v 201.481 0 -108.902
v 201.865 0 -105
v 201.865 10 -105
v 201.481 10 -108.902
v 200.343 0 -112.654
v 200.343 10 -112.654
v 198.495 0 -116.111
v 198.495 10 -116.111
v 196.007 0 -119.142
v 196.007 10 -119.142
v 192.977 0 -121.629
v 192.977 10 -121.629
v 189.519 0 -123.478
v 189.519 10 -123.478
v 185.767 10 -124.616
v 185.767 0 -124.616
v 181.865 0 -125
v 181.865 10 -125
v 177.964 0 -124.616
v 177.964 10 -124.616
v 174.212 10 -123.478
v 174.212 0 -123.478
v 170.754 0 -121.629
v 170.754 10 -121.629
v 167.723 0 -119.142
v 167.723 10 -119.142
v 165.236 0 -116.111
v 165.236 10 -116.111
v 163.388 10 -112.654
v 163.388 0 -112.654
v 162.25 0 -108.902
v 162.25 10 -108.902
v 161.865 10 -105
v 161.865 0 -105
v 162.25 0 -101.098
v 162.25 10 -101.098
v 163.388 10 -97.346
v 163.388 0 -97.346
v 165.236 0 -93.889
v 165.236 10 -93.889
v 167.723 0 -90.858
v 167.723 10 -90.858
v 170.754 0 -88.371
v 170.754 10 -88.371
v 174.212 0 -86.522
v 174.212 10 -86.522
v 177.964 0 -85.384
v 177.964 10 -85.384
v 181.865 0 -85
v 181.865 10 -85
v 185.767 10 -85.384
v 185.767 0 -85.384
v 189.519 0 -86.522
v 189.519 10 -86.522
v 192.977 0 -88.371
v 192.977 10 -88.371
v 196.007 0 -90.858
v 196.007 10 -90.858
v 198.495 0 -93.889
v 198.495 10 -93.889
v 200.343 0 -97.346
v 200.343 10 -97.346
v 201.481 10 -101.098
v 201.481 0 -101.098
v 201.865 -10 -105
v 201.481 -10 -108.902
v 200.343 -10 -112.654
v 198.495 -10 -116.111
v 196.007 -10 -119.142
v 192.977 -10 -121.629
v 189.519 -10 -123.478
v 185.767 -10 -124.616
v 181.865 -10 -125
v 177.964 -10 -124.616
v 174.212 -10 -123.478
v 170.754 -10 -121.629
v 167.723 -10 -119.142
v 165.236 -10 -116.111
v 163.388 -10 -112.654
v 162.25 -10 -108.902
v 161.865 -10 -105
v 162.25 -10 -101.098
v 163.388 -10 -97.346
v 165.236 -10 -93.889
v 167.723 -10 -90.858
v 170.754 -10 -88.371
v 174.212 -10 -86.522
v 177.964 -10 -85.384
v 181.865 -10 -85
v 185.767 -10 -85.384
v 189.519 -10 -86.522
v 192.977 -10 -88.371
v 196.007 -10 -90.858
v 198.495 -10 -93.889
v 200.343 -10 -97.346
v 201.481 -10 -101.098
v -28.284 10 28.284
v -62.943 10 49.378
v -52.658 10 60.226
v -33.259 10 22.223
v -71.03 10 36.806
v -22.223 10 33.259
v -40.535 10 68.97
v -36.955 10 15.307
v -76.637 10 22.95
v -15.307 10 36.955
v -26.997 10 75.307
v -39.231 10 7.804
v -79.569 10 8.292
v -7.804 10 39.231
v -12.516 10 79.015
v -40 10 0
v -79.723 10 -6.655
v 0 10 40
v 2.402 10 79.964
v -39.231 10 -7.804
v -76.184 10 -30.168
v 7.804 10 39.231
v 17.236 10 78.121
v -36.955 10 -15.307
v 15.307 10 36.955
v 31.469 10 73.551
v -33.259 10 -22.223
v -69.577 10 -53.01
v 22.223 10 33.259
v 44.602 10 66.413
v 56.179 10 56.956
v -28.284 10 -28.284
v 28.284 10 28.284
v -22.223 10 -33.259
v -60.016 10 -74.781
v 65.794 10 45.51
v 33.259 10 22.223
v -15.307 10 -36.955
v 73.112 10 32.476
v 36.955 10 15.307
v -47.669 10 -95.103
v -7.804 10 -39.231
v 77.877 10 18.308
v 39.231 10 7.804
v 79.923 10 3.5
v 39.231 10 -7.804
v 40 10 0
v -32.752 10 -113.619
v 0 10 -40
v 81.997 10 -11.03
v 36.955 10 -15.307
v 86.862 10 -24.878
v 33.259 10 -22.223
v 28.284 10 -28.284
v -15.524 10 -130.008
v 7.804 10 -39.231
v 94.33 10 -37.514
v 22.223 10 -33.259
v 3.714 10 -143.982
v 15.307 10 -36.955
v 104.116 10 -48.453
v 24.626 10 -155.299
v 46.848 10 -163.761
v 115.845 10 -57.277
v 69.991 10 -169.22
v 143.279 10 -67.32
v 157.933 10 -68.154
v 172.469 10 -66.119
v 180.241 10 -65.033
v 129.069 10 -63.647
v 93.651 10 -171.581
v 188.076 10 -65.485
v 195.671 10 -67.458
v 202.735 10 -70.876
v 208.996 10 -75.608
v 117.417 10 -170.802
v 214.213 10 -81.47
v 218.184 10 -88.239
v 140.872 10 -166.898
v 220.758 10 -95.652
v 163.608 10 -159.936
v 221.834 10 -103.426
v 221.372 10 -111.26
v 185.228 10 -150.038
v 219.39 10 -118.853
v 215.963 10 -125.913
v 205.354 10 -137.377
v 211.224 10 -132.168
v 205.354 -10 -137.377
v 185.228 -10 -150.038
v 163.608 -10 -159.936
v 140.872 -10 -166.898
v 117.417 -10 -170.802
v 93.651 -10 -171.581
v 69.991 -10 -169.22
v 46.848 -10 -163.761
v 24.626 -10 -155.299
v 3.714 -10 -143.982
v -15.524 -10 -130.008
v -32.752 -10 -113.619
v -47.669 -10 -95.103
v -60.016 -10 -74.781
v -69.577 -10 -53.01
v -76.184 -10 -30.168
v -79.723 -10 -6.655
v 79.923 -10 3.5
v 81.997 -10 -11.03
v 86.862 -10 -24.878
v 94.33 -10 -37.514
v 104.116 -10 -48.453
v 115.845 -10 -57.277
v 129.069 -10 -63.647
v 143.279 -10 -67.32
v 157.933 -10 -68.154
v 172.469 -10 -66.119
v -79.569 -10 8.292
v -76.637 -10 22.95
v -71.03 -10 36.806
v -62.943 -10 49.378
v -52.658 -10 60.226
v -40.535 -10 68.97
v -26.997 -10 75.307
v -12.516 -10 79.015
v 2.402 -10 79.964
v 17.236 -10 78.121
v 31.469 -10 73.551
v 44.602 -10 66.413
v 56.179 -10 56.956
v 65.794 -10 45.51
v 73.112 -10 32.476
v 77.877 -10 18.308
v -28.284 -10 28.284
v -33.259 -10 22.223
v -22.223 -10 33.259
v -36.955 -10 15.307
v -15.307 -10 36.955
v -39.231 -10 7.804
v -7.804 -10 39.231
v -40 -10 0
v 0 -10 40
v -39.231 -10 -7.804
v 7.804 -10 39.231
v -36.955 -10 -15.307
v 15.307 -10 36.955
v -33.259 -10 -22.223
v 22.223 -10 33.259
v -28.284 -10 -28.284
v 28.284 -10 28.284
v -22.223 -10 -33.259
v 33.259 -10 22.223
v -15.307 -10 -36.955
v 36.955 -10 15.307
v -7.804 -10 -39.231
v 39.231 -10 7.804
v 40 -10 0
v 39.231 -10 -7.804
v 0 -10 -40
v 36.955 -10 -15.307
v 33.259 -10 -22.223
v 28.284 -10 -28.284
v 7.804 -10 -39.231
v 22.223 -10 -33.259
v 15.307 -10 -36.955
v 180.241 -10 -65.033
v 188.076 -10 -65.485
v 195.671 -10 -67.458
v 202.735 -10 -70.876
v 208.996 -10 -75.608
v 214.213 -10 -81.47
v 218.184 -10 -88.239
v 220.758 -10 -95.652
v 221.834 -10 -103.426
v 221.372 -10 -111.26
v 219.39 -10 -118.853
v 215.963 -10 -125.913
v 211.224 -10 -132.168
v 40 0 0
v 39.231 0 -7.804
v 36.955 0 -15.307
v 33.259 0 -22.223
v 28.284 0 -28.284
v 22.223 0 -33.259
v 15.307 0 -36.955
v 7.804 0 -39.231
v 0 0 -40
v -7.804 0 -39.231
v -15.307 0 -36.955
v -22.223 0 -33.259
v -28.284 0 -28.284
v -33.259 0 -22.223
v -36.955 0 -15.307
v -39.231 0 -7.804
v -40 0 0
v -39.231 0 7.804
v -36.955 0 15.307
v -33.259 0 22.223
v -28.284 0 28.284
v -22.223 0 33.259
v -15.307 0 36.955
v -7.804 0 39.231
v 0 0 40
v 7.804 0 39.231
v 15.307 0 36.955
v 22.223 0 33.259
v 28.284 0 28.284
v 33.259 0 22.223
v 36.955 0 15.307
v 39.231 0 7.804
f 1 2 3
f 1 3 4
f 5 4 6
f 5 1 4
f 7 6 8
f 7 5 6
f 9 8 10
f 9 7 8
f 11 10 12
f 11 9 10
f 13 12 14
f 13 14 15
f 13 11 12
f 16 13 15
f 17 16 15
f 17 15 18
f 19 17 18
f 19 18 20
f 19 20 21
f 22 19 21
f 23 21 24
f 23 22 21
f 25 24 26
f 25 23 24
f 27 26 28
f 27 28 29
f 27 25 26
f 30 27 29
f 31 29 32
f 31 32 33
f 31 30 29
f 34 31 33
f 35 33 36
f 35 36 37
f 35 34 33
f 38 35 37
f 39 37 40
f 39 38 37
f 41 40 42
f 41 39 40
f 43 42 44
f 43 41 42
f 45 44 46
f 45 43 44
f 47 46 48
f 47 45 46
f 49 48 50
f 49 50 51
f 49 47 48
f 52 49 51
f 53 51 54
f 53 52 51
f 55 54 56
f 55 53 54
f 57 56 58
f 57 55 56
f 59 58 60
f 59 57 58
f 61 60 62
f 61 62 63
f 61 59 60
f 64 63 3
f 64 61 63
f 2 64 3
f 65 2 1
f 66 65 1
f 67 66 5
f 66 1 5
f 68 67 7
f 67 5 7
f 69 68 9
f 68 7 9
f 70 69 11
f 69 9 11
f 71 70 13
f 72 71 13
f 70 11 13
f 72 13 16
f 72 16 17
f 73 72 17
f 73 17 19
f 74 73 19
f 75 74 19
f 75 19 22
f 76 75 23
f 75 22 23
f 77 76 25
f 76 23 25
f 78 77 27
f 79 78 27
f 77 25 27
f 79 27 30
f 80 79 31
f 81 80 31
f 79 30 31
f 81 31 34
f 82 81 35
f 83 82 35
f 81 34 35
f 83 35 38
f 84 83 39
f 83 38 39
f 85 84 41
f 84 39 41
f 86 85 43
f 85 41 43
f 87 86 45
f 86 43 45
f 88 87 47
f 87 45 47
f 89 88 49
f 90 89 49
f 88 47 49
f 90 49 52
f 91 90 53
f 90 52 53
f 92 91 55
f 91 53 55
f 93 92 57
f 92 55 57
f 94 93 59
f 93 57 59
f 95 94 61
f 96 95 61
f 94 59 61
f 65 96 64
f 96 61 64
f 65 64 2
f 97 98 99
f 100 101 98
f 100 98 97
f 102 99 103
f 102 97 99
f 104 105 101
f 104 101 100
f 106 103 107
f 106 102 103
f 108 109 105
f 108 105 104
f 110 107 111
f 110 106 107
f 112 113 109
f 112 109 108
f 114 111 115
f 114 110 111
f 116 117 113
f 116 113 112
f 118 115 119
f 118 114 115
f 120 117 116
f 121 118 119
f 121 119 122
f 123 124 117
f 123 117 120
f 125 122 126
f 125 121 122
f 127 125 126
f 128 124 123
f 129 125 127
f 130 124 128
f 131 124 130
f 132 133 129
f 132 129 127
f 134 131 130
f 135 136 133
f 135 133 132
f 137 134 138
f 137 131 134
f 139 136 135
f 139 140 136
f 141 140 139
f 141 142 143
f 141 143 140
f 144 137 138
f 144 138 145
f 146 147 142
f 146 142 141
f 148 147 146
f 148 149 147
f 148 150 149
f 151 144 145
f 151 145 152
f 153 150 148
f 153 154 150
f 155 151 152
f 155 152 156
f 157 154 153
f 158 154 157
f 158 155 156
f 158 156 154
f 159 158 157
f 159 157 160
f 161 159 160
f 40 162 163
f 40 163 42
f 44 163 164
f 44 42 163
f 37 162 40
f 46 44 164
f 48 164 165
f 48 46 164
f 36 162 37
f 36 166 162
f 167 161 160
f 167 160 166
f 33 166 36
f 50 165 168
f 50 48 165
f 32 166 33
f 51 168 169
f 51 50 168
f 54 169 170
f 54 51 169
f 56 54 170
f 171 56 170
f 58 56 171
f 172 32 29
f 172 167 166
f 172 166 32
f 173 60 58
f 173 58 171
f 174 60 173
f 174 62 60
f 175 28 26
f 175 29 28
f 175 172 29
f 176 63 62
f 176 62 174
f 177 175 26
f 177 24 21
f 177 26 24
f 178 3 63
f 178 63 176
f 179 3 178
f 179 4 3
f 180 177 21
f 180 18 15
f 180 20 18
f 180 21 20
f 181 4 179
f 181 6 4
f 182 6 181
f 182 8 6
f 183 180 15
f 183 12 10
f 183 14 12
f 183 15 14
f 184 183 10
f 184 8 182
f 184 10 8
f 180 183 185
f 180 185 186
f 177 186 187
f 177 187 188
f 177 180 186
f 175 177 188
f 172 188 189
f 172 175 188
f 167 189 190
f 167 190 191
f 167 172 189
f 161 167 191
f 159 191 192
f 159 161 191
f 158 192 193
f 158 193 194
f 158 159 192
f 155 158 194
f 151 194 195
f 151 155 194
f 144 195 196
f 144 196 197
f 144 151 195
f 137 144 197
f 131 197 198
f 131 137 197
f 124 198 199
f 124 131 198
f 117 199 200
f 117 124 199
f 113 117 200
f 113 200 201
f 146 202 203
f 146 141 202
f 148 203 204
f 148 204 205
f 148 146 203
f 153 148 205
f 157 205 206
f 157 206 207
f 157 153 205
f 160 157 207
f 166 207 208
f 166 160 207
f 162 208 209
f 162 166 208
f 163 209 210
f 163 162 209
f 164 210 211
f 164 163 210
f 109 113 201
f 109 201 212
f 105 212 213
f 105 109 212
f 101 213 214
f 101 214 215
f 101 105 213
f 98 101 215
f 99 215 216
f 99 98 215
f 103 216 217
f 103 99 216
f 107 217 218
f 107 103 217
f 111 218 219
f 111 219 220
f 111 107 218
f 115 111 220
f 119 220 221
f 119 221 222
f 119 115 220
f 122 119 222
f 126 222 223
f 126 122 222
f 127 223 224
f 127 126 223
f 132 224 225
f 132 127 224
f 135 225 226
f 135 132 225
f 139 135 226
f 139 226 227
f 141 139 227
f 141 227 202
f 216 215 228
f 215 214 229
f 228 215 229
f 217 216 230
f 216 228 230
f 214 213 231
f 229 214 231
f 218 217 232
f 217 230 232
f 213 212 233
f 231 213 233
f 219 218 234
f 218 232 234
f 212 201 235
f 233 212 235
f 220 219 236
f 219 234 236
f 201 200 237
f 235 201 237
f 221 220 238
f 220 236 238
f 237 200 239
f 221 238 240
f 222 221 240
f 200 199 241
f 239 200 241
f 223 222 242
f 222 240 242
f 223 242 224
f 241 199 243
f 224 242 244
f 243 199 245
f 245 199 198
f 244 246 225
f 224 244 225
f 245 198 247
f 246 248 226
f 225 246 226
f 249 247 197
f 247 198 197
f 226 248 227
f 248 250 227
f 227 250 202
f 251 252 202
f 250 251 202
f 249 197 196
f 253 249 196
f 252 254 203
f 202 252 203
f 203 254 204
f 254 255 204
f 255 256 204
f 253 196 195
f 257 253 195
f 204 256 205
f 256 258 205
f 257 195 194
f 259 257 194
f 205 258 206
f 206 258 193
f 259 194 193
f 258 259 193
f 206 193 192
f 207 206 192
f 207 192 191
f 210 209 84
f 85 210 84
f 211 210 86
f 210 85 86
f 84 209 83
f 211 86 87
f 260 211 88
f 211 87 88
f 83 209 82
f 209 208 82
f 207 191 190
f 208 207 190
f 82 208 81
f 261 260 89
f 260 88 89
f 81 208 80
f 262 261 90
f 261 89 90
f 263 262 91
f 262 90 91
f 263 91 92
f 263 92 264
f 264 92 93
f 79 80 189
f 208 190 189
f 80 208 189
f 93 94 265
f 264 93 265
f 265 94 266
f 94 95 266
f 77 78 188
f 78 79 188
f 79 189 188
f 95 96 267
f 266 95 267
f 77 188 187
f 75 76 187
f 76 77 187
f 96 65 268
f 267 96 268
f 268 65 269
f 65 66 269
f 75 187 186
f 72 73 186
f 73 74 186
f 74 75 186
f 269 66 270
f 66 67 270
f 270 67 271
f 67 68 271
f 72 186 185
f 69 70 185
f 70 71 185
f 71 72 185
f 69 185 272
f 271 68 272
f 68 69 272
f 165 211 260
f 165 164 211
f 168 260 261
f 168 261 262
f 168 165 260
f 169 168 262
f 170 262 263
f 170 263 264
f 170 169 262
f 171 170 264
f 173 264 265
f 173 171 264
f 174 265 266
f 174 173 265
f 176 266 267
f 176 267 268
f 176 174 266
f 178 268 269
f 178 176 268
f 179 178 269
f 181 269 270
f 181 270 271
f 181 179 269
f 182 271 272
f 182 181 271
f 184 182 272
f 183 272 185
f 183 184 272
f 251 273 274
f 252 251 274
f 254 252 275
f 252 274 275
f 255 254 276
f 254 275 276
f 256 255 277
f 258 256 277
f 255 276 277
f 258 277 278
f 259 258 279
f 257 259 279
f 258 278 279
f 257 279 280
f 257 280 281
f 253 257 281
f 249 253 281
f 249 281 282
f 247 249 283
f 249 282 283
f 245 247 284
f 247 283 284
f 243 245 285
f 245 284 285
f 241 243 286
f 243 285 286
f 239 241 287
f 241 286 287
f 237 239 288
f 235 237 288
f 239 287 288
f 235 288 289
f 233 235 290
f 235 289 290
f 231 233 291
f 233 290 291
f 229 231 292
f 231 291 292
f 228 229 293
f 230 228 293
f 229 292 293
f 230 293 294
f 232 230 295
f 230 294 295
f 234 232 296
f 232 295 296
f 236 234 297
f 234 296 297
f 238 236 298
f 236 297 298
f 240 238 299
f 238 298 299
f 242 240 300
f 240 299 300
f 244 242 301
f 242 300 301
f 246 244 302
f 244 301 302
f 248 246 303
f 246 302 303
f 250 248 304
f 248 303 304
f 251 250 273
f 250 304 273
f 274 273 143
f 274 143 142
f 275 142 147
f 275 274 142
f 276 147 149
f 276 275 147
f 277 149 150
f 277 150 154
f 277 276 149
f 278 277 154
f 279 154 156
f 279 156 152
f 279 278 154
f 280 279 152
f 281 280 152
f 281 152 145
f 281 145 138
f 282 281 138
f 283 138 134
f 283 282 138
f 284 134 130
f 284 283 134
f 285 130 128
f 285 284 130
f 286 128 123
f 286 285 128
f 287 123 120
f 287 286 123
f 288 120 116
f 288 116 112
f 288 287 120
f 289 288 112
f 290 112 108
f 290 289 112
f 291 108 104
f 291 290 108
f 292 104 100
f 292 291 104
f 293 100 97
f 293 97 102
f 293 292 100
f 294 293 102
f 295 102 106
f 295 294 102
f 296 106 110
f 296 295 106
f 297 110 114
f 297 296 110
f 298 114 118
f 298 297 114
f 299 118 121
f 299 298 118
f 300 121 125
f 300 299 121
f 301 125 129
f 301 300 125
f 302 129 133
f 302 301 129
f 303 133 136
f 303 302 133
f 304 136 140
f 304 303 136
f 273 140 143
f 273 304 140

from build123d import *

# Parameters (mm, degrees)
CROQUIS2_R                   = 40
CROQUIS2_R_2                 = 20
SALIENTE_EXTRUIR1_DEPTH      = 10
SALIENTE_EXTRUIR1_DEPTH_BACK = 10


with BuildPart() as part:
    # Croquis2 → Saliente-Extruir1 (new body, two sides)
    with BuildSketch(Plane(origin=(0, 0, 0), x_dir=(1, 0, 0), z_dir=(0, 1, 0))) as saliente_extruir1_sk:
        with BuildLine():
            ThreePointArc((172.469235199, 66.119242389), (218.184271838, 88.238889892), (205.354467187, 137.376853761))
            ThreePointArc((205.354467187, 137.376853761), (24.626451497, 155.299352148), (-79.722697138, 6.655190531))
            ThreePointArc((-79.722697138, 6.655190531), (-5.078826092, -79.838621766), (79.923379849, -3.500479035))
            ThreePointArc((79.923379849, -3.500479035), (109.764419077, 53.152375878), (172.469235199, 66.119242389))
        make_face()
        Circle(CROQUIS2_R, mode=Mode.SUBTRACT)
        with Locations((181.865334795, 105)):
            Circle(CROQUIS2_R_2, mode=Mode.SUBTRACT)
    extrude(amount=SALIENTE_EXTRUIR1_DEPTH)
    extrude(saliente_extruir1_sk.sketch, amount=-SALIENTE_EXTRUIR1_DEPTH_BACK)


solid = part.part
